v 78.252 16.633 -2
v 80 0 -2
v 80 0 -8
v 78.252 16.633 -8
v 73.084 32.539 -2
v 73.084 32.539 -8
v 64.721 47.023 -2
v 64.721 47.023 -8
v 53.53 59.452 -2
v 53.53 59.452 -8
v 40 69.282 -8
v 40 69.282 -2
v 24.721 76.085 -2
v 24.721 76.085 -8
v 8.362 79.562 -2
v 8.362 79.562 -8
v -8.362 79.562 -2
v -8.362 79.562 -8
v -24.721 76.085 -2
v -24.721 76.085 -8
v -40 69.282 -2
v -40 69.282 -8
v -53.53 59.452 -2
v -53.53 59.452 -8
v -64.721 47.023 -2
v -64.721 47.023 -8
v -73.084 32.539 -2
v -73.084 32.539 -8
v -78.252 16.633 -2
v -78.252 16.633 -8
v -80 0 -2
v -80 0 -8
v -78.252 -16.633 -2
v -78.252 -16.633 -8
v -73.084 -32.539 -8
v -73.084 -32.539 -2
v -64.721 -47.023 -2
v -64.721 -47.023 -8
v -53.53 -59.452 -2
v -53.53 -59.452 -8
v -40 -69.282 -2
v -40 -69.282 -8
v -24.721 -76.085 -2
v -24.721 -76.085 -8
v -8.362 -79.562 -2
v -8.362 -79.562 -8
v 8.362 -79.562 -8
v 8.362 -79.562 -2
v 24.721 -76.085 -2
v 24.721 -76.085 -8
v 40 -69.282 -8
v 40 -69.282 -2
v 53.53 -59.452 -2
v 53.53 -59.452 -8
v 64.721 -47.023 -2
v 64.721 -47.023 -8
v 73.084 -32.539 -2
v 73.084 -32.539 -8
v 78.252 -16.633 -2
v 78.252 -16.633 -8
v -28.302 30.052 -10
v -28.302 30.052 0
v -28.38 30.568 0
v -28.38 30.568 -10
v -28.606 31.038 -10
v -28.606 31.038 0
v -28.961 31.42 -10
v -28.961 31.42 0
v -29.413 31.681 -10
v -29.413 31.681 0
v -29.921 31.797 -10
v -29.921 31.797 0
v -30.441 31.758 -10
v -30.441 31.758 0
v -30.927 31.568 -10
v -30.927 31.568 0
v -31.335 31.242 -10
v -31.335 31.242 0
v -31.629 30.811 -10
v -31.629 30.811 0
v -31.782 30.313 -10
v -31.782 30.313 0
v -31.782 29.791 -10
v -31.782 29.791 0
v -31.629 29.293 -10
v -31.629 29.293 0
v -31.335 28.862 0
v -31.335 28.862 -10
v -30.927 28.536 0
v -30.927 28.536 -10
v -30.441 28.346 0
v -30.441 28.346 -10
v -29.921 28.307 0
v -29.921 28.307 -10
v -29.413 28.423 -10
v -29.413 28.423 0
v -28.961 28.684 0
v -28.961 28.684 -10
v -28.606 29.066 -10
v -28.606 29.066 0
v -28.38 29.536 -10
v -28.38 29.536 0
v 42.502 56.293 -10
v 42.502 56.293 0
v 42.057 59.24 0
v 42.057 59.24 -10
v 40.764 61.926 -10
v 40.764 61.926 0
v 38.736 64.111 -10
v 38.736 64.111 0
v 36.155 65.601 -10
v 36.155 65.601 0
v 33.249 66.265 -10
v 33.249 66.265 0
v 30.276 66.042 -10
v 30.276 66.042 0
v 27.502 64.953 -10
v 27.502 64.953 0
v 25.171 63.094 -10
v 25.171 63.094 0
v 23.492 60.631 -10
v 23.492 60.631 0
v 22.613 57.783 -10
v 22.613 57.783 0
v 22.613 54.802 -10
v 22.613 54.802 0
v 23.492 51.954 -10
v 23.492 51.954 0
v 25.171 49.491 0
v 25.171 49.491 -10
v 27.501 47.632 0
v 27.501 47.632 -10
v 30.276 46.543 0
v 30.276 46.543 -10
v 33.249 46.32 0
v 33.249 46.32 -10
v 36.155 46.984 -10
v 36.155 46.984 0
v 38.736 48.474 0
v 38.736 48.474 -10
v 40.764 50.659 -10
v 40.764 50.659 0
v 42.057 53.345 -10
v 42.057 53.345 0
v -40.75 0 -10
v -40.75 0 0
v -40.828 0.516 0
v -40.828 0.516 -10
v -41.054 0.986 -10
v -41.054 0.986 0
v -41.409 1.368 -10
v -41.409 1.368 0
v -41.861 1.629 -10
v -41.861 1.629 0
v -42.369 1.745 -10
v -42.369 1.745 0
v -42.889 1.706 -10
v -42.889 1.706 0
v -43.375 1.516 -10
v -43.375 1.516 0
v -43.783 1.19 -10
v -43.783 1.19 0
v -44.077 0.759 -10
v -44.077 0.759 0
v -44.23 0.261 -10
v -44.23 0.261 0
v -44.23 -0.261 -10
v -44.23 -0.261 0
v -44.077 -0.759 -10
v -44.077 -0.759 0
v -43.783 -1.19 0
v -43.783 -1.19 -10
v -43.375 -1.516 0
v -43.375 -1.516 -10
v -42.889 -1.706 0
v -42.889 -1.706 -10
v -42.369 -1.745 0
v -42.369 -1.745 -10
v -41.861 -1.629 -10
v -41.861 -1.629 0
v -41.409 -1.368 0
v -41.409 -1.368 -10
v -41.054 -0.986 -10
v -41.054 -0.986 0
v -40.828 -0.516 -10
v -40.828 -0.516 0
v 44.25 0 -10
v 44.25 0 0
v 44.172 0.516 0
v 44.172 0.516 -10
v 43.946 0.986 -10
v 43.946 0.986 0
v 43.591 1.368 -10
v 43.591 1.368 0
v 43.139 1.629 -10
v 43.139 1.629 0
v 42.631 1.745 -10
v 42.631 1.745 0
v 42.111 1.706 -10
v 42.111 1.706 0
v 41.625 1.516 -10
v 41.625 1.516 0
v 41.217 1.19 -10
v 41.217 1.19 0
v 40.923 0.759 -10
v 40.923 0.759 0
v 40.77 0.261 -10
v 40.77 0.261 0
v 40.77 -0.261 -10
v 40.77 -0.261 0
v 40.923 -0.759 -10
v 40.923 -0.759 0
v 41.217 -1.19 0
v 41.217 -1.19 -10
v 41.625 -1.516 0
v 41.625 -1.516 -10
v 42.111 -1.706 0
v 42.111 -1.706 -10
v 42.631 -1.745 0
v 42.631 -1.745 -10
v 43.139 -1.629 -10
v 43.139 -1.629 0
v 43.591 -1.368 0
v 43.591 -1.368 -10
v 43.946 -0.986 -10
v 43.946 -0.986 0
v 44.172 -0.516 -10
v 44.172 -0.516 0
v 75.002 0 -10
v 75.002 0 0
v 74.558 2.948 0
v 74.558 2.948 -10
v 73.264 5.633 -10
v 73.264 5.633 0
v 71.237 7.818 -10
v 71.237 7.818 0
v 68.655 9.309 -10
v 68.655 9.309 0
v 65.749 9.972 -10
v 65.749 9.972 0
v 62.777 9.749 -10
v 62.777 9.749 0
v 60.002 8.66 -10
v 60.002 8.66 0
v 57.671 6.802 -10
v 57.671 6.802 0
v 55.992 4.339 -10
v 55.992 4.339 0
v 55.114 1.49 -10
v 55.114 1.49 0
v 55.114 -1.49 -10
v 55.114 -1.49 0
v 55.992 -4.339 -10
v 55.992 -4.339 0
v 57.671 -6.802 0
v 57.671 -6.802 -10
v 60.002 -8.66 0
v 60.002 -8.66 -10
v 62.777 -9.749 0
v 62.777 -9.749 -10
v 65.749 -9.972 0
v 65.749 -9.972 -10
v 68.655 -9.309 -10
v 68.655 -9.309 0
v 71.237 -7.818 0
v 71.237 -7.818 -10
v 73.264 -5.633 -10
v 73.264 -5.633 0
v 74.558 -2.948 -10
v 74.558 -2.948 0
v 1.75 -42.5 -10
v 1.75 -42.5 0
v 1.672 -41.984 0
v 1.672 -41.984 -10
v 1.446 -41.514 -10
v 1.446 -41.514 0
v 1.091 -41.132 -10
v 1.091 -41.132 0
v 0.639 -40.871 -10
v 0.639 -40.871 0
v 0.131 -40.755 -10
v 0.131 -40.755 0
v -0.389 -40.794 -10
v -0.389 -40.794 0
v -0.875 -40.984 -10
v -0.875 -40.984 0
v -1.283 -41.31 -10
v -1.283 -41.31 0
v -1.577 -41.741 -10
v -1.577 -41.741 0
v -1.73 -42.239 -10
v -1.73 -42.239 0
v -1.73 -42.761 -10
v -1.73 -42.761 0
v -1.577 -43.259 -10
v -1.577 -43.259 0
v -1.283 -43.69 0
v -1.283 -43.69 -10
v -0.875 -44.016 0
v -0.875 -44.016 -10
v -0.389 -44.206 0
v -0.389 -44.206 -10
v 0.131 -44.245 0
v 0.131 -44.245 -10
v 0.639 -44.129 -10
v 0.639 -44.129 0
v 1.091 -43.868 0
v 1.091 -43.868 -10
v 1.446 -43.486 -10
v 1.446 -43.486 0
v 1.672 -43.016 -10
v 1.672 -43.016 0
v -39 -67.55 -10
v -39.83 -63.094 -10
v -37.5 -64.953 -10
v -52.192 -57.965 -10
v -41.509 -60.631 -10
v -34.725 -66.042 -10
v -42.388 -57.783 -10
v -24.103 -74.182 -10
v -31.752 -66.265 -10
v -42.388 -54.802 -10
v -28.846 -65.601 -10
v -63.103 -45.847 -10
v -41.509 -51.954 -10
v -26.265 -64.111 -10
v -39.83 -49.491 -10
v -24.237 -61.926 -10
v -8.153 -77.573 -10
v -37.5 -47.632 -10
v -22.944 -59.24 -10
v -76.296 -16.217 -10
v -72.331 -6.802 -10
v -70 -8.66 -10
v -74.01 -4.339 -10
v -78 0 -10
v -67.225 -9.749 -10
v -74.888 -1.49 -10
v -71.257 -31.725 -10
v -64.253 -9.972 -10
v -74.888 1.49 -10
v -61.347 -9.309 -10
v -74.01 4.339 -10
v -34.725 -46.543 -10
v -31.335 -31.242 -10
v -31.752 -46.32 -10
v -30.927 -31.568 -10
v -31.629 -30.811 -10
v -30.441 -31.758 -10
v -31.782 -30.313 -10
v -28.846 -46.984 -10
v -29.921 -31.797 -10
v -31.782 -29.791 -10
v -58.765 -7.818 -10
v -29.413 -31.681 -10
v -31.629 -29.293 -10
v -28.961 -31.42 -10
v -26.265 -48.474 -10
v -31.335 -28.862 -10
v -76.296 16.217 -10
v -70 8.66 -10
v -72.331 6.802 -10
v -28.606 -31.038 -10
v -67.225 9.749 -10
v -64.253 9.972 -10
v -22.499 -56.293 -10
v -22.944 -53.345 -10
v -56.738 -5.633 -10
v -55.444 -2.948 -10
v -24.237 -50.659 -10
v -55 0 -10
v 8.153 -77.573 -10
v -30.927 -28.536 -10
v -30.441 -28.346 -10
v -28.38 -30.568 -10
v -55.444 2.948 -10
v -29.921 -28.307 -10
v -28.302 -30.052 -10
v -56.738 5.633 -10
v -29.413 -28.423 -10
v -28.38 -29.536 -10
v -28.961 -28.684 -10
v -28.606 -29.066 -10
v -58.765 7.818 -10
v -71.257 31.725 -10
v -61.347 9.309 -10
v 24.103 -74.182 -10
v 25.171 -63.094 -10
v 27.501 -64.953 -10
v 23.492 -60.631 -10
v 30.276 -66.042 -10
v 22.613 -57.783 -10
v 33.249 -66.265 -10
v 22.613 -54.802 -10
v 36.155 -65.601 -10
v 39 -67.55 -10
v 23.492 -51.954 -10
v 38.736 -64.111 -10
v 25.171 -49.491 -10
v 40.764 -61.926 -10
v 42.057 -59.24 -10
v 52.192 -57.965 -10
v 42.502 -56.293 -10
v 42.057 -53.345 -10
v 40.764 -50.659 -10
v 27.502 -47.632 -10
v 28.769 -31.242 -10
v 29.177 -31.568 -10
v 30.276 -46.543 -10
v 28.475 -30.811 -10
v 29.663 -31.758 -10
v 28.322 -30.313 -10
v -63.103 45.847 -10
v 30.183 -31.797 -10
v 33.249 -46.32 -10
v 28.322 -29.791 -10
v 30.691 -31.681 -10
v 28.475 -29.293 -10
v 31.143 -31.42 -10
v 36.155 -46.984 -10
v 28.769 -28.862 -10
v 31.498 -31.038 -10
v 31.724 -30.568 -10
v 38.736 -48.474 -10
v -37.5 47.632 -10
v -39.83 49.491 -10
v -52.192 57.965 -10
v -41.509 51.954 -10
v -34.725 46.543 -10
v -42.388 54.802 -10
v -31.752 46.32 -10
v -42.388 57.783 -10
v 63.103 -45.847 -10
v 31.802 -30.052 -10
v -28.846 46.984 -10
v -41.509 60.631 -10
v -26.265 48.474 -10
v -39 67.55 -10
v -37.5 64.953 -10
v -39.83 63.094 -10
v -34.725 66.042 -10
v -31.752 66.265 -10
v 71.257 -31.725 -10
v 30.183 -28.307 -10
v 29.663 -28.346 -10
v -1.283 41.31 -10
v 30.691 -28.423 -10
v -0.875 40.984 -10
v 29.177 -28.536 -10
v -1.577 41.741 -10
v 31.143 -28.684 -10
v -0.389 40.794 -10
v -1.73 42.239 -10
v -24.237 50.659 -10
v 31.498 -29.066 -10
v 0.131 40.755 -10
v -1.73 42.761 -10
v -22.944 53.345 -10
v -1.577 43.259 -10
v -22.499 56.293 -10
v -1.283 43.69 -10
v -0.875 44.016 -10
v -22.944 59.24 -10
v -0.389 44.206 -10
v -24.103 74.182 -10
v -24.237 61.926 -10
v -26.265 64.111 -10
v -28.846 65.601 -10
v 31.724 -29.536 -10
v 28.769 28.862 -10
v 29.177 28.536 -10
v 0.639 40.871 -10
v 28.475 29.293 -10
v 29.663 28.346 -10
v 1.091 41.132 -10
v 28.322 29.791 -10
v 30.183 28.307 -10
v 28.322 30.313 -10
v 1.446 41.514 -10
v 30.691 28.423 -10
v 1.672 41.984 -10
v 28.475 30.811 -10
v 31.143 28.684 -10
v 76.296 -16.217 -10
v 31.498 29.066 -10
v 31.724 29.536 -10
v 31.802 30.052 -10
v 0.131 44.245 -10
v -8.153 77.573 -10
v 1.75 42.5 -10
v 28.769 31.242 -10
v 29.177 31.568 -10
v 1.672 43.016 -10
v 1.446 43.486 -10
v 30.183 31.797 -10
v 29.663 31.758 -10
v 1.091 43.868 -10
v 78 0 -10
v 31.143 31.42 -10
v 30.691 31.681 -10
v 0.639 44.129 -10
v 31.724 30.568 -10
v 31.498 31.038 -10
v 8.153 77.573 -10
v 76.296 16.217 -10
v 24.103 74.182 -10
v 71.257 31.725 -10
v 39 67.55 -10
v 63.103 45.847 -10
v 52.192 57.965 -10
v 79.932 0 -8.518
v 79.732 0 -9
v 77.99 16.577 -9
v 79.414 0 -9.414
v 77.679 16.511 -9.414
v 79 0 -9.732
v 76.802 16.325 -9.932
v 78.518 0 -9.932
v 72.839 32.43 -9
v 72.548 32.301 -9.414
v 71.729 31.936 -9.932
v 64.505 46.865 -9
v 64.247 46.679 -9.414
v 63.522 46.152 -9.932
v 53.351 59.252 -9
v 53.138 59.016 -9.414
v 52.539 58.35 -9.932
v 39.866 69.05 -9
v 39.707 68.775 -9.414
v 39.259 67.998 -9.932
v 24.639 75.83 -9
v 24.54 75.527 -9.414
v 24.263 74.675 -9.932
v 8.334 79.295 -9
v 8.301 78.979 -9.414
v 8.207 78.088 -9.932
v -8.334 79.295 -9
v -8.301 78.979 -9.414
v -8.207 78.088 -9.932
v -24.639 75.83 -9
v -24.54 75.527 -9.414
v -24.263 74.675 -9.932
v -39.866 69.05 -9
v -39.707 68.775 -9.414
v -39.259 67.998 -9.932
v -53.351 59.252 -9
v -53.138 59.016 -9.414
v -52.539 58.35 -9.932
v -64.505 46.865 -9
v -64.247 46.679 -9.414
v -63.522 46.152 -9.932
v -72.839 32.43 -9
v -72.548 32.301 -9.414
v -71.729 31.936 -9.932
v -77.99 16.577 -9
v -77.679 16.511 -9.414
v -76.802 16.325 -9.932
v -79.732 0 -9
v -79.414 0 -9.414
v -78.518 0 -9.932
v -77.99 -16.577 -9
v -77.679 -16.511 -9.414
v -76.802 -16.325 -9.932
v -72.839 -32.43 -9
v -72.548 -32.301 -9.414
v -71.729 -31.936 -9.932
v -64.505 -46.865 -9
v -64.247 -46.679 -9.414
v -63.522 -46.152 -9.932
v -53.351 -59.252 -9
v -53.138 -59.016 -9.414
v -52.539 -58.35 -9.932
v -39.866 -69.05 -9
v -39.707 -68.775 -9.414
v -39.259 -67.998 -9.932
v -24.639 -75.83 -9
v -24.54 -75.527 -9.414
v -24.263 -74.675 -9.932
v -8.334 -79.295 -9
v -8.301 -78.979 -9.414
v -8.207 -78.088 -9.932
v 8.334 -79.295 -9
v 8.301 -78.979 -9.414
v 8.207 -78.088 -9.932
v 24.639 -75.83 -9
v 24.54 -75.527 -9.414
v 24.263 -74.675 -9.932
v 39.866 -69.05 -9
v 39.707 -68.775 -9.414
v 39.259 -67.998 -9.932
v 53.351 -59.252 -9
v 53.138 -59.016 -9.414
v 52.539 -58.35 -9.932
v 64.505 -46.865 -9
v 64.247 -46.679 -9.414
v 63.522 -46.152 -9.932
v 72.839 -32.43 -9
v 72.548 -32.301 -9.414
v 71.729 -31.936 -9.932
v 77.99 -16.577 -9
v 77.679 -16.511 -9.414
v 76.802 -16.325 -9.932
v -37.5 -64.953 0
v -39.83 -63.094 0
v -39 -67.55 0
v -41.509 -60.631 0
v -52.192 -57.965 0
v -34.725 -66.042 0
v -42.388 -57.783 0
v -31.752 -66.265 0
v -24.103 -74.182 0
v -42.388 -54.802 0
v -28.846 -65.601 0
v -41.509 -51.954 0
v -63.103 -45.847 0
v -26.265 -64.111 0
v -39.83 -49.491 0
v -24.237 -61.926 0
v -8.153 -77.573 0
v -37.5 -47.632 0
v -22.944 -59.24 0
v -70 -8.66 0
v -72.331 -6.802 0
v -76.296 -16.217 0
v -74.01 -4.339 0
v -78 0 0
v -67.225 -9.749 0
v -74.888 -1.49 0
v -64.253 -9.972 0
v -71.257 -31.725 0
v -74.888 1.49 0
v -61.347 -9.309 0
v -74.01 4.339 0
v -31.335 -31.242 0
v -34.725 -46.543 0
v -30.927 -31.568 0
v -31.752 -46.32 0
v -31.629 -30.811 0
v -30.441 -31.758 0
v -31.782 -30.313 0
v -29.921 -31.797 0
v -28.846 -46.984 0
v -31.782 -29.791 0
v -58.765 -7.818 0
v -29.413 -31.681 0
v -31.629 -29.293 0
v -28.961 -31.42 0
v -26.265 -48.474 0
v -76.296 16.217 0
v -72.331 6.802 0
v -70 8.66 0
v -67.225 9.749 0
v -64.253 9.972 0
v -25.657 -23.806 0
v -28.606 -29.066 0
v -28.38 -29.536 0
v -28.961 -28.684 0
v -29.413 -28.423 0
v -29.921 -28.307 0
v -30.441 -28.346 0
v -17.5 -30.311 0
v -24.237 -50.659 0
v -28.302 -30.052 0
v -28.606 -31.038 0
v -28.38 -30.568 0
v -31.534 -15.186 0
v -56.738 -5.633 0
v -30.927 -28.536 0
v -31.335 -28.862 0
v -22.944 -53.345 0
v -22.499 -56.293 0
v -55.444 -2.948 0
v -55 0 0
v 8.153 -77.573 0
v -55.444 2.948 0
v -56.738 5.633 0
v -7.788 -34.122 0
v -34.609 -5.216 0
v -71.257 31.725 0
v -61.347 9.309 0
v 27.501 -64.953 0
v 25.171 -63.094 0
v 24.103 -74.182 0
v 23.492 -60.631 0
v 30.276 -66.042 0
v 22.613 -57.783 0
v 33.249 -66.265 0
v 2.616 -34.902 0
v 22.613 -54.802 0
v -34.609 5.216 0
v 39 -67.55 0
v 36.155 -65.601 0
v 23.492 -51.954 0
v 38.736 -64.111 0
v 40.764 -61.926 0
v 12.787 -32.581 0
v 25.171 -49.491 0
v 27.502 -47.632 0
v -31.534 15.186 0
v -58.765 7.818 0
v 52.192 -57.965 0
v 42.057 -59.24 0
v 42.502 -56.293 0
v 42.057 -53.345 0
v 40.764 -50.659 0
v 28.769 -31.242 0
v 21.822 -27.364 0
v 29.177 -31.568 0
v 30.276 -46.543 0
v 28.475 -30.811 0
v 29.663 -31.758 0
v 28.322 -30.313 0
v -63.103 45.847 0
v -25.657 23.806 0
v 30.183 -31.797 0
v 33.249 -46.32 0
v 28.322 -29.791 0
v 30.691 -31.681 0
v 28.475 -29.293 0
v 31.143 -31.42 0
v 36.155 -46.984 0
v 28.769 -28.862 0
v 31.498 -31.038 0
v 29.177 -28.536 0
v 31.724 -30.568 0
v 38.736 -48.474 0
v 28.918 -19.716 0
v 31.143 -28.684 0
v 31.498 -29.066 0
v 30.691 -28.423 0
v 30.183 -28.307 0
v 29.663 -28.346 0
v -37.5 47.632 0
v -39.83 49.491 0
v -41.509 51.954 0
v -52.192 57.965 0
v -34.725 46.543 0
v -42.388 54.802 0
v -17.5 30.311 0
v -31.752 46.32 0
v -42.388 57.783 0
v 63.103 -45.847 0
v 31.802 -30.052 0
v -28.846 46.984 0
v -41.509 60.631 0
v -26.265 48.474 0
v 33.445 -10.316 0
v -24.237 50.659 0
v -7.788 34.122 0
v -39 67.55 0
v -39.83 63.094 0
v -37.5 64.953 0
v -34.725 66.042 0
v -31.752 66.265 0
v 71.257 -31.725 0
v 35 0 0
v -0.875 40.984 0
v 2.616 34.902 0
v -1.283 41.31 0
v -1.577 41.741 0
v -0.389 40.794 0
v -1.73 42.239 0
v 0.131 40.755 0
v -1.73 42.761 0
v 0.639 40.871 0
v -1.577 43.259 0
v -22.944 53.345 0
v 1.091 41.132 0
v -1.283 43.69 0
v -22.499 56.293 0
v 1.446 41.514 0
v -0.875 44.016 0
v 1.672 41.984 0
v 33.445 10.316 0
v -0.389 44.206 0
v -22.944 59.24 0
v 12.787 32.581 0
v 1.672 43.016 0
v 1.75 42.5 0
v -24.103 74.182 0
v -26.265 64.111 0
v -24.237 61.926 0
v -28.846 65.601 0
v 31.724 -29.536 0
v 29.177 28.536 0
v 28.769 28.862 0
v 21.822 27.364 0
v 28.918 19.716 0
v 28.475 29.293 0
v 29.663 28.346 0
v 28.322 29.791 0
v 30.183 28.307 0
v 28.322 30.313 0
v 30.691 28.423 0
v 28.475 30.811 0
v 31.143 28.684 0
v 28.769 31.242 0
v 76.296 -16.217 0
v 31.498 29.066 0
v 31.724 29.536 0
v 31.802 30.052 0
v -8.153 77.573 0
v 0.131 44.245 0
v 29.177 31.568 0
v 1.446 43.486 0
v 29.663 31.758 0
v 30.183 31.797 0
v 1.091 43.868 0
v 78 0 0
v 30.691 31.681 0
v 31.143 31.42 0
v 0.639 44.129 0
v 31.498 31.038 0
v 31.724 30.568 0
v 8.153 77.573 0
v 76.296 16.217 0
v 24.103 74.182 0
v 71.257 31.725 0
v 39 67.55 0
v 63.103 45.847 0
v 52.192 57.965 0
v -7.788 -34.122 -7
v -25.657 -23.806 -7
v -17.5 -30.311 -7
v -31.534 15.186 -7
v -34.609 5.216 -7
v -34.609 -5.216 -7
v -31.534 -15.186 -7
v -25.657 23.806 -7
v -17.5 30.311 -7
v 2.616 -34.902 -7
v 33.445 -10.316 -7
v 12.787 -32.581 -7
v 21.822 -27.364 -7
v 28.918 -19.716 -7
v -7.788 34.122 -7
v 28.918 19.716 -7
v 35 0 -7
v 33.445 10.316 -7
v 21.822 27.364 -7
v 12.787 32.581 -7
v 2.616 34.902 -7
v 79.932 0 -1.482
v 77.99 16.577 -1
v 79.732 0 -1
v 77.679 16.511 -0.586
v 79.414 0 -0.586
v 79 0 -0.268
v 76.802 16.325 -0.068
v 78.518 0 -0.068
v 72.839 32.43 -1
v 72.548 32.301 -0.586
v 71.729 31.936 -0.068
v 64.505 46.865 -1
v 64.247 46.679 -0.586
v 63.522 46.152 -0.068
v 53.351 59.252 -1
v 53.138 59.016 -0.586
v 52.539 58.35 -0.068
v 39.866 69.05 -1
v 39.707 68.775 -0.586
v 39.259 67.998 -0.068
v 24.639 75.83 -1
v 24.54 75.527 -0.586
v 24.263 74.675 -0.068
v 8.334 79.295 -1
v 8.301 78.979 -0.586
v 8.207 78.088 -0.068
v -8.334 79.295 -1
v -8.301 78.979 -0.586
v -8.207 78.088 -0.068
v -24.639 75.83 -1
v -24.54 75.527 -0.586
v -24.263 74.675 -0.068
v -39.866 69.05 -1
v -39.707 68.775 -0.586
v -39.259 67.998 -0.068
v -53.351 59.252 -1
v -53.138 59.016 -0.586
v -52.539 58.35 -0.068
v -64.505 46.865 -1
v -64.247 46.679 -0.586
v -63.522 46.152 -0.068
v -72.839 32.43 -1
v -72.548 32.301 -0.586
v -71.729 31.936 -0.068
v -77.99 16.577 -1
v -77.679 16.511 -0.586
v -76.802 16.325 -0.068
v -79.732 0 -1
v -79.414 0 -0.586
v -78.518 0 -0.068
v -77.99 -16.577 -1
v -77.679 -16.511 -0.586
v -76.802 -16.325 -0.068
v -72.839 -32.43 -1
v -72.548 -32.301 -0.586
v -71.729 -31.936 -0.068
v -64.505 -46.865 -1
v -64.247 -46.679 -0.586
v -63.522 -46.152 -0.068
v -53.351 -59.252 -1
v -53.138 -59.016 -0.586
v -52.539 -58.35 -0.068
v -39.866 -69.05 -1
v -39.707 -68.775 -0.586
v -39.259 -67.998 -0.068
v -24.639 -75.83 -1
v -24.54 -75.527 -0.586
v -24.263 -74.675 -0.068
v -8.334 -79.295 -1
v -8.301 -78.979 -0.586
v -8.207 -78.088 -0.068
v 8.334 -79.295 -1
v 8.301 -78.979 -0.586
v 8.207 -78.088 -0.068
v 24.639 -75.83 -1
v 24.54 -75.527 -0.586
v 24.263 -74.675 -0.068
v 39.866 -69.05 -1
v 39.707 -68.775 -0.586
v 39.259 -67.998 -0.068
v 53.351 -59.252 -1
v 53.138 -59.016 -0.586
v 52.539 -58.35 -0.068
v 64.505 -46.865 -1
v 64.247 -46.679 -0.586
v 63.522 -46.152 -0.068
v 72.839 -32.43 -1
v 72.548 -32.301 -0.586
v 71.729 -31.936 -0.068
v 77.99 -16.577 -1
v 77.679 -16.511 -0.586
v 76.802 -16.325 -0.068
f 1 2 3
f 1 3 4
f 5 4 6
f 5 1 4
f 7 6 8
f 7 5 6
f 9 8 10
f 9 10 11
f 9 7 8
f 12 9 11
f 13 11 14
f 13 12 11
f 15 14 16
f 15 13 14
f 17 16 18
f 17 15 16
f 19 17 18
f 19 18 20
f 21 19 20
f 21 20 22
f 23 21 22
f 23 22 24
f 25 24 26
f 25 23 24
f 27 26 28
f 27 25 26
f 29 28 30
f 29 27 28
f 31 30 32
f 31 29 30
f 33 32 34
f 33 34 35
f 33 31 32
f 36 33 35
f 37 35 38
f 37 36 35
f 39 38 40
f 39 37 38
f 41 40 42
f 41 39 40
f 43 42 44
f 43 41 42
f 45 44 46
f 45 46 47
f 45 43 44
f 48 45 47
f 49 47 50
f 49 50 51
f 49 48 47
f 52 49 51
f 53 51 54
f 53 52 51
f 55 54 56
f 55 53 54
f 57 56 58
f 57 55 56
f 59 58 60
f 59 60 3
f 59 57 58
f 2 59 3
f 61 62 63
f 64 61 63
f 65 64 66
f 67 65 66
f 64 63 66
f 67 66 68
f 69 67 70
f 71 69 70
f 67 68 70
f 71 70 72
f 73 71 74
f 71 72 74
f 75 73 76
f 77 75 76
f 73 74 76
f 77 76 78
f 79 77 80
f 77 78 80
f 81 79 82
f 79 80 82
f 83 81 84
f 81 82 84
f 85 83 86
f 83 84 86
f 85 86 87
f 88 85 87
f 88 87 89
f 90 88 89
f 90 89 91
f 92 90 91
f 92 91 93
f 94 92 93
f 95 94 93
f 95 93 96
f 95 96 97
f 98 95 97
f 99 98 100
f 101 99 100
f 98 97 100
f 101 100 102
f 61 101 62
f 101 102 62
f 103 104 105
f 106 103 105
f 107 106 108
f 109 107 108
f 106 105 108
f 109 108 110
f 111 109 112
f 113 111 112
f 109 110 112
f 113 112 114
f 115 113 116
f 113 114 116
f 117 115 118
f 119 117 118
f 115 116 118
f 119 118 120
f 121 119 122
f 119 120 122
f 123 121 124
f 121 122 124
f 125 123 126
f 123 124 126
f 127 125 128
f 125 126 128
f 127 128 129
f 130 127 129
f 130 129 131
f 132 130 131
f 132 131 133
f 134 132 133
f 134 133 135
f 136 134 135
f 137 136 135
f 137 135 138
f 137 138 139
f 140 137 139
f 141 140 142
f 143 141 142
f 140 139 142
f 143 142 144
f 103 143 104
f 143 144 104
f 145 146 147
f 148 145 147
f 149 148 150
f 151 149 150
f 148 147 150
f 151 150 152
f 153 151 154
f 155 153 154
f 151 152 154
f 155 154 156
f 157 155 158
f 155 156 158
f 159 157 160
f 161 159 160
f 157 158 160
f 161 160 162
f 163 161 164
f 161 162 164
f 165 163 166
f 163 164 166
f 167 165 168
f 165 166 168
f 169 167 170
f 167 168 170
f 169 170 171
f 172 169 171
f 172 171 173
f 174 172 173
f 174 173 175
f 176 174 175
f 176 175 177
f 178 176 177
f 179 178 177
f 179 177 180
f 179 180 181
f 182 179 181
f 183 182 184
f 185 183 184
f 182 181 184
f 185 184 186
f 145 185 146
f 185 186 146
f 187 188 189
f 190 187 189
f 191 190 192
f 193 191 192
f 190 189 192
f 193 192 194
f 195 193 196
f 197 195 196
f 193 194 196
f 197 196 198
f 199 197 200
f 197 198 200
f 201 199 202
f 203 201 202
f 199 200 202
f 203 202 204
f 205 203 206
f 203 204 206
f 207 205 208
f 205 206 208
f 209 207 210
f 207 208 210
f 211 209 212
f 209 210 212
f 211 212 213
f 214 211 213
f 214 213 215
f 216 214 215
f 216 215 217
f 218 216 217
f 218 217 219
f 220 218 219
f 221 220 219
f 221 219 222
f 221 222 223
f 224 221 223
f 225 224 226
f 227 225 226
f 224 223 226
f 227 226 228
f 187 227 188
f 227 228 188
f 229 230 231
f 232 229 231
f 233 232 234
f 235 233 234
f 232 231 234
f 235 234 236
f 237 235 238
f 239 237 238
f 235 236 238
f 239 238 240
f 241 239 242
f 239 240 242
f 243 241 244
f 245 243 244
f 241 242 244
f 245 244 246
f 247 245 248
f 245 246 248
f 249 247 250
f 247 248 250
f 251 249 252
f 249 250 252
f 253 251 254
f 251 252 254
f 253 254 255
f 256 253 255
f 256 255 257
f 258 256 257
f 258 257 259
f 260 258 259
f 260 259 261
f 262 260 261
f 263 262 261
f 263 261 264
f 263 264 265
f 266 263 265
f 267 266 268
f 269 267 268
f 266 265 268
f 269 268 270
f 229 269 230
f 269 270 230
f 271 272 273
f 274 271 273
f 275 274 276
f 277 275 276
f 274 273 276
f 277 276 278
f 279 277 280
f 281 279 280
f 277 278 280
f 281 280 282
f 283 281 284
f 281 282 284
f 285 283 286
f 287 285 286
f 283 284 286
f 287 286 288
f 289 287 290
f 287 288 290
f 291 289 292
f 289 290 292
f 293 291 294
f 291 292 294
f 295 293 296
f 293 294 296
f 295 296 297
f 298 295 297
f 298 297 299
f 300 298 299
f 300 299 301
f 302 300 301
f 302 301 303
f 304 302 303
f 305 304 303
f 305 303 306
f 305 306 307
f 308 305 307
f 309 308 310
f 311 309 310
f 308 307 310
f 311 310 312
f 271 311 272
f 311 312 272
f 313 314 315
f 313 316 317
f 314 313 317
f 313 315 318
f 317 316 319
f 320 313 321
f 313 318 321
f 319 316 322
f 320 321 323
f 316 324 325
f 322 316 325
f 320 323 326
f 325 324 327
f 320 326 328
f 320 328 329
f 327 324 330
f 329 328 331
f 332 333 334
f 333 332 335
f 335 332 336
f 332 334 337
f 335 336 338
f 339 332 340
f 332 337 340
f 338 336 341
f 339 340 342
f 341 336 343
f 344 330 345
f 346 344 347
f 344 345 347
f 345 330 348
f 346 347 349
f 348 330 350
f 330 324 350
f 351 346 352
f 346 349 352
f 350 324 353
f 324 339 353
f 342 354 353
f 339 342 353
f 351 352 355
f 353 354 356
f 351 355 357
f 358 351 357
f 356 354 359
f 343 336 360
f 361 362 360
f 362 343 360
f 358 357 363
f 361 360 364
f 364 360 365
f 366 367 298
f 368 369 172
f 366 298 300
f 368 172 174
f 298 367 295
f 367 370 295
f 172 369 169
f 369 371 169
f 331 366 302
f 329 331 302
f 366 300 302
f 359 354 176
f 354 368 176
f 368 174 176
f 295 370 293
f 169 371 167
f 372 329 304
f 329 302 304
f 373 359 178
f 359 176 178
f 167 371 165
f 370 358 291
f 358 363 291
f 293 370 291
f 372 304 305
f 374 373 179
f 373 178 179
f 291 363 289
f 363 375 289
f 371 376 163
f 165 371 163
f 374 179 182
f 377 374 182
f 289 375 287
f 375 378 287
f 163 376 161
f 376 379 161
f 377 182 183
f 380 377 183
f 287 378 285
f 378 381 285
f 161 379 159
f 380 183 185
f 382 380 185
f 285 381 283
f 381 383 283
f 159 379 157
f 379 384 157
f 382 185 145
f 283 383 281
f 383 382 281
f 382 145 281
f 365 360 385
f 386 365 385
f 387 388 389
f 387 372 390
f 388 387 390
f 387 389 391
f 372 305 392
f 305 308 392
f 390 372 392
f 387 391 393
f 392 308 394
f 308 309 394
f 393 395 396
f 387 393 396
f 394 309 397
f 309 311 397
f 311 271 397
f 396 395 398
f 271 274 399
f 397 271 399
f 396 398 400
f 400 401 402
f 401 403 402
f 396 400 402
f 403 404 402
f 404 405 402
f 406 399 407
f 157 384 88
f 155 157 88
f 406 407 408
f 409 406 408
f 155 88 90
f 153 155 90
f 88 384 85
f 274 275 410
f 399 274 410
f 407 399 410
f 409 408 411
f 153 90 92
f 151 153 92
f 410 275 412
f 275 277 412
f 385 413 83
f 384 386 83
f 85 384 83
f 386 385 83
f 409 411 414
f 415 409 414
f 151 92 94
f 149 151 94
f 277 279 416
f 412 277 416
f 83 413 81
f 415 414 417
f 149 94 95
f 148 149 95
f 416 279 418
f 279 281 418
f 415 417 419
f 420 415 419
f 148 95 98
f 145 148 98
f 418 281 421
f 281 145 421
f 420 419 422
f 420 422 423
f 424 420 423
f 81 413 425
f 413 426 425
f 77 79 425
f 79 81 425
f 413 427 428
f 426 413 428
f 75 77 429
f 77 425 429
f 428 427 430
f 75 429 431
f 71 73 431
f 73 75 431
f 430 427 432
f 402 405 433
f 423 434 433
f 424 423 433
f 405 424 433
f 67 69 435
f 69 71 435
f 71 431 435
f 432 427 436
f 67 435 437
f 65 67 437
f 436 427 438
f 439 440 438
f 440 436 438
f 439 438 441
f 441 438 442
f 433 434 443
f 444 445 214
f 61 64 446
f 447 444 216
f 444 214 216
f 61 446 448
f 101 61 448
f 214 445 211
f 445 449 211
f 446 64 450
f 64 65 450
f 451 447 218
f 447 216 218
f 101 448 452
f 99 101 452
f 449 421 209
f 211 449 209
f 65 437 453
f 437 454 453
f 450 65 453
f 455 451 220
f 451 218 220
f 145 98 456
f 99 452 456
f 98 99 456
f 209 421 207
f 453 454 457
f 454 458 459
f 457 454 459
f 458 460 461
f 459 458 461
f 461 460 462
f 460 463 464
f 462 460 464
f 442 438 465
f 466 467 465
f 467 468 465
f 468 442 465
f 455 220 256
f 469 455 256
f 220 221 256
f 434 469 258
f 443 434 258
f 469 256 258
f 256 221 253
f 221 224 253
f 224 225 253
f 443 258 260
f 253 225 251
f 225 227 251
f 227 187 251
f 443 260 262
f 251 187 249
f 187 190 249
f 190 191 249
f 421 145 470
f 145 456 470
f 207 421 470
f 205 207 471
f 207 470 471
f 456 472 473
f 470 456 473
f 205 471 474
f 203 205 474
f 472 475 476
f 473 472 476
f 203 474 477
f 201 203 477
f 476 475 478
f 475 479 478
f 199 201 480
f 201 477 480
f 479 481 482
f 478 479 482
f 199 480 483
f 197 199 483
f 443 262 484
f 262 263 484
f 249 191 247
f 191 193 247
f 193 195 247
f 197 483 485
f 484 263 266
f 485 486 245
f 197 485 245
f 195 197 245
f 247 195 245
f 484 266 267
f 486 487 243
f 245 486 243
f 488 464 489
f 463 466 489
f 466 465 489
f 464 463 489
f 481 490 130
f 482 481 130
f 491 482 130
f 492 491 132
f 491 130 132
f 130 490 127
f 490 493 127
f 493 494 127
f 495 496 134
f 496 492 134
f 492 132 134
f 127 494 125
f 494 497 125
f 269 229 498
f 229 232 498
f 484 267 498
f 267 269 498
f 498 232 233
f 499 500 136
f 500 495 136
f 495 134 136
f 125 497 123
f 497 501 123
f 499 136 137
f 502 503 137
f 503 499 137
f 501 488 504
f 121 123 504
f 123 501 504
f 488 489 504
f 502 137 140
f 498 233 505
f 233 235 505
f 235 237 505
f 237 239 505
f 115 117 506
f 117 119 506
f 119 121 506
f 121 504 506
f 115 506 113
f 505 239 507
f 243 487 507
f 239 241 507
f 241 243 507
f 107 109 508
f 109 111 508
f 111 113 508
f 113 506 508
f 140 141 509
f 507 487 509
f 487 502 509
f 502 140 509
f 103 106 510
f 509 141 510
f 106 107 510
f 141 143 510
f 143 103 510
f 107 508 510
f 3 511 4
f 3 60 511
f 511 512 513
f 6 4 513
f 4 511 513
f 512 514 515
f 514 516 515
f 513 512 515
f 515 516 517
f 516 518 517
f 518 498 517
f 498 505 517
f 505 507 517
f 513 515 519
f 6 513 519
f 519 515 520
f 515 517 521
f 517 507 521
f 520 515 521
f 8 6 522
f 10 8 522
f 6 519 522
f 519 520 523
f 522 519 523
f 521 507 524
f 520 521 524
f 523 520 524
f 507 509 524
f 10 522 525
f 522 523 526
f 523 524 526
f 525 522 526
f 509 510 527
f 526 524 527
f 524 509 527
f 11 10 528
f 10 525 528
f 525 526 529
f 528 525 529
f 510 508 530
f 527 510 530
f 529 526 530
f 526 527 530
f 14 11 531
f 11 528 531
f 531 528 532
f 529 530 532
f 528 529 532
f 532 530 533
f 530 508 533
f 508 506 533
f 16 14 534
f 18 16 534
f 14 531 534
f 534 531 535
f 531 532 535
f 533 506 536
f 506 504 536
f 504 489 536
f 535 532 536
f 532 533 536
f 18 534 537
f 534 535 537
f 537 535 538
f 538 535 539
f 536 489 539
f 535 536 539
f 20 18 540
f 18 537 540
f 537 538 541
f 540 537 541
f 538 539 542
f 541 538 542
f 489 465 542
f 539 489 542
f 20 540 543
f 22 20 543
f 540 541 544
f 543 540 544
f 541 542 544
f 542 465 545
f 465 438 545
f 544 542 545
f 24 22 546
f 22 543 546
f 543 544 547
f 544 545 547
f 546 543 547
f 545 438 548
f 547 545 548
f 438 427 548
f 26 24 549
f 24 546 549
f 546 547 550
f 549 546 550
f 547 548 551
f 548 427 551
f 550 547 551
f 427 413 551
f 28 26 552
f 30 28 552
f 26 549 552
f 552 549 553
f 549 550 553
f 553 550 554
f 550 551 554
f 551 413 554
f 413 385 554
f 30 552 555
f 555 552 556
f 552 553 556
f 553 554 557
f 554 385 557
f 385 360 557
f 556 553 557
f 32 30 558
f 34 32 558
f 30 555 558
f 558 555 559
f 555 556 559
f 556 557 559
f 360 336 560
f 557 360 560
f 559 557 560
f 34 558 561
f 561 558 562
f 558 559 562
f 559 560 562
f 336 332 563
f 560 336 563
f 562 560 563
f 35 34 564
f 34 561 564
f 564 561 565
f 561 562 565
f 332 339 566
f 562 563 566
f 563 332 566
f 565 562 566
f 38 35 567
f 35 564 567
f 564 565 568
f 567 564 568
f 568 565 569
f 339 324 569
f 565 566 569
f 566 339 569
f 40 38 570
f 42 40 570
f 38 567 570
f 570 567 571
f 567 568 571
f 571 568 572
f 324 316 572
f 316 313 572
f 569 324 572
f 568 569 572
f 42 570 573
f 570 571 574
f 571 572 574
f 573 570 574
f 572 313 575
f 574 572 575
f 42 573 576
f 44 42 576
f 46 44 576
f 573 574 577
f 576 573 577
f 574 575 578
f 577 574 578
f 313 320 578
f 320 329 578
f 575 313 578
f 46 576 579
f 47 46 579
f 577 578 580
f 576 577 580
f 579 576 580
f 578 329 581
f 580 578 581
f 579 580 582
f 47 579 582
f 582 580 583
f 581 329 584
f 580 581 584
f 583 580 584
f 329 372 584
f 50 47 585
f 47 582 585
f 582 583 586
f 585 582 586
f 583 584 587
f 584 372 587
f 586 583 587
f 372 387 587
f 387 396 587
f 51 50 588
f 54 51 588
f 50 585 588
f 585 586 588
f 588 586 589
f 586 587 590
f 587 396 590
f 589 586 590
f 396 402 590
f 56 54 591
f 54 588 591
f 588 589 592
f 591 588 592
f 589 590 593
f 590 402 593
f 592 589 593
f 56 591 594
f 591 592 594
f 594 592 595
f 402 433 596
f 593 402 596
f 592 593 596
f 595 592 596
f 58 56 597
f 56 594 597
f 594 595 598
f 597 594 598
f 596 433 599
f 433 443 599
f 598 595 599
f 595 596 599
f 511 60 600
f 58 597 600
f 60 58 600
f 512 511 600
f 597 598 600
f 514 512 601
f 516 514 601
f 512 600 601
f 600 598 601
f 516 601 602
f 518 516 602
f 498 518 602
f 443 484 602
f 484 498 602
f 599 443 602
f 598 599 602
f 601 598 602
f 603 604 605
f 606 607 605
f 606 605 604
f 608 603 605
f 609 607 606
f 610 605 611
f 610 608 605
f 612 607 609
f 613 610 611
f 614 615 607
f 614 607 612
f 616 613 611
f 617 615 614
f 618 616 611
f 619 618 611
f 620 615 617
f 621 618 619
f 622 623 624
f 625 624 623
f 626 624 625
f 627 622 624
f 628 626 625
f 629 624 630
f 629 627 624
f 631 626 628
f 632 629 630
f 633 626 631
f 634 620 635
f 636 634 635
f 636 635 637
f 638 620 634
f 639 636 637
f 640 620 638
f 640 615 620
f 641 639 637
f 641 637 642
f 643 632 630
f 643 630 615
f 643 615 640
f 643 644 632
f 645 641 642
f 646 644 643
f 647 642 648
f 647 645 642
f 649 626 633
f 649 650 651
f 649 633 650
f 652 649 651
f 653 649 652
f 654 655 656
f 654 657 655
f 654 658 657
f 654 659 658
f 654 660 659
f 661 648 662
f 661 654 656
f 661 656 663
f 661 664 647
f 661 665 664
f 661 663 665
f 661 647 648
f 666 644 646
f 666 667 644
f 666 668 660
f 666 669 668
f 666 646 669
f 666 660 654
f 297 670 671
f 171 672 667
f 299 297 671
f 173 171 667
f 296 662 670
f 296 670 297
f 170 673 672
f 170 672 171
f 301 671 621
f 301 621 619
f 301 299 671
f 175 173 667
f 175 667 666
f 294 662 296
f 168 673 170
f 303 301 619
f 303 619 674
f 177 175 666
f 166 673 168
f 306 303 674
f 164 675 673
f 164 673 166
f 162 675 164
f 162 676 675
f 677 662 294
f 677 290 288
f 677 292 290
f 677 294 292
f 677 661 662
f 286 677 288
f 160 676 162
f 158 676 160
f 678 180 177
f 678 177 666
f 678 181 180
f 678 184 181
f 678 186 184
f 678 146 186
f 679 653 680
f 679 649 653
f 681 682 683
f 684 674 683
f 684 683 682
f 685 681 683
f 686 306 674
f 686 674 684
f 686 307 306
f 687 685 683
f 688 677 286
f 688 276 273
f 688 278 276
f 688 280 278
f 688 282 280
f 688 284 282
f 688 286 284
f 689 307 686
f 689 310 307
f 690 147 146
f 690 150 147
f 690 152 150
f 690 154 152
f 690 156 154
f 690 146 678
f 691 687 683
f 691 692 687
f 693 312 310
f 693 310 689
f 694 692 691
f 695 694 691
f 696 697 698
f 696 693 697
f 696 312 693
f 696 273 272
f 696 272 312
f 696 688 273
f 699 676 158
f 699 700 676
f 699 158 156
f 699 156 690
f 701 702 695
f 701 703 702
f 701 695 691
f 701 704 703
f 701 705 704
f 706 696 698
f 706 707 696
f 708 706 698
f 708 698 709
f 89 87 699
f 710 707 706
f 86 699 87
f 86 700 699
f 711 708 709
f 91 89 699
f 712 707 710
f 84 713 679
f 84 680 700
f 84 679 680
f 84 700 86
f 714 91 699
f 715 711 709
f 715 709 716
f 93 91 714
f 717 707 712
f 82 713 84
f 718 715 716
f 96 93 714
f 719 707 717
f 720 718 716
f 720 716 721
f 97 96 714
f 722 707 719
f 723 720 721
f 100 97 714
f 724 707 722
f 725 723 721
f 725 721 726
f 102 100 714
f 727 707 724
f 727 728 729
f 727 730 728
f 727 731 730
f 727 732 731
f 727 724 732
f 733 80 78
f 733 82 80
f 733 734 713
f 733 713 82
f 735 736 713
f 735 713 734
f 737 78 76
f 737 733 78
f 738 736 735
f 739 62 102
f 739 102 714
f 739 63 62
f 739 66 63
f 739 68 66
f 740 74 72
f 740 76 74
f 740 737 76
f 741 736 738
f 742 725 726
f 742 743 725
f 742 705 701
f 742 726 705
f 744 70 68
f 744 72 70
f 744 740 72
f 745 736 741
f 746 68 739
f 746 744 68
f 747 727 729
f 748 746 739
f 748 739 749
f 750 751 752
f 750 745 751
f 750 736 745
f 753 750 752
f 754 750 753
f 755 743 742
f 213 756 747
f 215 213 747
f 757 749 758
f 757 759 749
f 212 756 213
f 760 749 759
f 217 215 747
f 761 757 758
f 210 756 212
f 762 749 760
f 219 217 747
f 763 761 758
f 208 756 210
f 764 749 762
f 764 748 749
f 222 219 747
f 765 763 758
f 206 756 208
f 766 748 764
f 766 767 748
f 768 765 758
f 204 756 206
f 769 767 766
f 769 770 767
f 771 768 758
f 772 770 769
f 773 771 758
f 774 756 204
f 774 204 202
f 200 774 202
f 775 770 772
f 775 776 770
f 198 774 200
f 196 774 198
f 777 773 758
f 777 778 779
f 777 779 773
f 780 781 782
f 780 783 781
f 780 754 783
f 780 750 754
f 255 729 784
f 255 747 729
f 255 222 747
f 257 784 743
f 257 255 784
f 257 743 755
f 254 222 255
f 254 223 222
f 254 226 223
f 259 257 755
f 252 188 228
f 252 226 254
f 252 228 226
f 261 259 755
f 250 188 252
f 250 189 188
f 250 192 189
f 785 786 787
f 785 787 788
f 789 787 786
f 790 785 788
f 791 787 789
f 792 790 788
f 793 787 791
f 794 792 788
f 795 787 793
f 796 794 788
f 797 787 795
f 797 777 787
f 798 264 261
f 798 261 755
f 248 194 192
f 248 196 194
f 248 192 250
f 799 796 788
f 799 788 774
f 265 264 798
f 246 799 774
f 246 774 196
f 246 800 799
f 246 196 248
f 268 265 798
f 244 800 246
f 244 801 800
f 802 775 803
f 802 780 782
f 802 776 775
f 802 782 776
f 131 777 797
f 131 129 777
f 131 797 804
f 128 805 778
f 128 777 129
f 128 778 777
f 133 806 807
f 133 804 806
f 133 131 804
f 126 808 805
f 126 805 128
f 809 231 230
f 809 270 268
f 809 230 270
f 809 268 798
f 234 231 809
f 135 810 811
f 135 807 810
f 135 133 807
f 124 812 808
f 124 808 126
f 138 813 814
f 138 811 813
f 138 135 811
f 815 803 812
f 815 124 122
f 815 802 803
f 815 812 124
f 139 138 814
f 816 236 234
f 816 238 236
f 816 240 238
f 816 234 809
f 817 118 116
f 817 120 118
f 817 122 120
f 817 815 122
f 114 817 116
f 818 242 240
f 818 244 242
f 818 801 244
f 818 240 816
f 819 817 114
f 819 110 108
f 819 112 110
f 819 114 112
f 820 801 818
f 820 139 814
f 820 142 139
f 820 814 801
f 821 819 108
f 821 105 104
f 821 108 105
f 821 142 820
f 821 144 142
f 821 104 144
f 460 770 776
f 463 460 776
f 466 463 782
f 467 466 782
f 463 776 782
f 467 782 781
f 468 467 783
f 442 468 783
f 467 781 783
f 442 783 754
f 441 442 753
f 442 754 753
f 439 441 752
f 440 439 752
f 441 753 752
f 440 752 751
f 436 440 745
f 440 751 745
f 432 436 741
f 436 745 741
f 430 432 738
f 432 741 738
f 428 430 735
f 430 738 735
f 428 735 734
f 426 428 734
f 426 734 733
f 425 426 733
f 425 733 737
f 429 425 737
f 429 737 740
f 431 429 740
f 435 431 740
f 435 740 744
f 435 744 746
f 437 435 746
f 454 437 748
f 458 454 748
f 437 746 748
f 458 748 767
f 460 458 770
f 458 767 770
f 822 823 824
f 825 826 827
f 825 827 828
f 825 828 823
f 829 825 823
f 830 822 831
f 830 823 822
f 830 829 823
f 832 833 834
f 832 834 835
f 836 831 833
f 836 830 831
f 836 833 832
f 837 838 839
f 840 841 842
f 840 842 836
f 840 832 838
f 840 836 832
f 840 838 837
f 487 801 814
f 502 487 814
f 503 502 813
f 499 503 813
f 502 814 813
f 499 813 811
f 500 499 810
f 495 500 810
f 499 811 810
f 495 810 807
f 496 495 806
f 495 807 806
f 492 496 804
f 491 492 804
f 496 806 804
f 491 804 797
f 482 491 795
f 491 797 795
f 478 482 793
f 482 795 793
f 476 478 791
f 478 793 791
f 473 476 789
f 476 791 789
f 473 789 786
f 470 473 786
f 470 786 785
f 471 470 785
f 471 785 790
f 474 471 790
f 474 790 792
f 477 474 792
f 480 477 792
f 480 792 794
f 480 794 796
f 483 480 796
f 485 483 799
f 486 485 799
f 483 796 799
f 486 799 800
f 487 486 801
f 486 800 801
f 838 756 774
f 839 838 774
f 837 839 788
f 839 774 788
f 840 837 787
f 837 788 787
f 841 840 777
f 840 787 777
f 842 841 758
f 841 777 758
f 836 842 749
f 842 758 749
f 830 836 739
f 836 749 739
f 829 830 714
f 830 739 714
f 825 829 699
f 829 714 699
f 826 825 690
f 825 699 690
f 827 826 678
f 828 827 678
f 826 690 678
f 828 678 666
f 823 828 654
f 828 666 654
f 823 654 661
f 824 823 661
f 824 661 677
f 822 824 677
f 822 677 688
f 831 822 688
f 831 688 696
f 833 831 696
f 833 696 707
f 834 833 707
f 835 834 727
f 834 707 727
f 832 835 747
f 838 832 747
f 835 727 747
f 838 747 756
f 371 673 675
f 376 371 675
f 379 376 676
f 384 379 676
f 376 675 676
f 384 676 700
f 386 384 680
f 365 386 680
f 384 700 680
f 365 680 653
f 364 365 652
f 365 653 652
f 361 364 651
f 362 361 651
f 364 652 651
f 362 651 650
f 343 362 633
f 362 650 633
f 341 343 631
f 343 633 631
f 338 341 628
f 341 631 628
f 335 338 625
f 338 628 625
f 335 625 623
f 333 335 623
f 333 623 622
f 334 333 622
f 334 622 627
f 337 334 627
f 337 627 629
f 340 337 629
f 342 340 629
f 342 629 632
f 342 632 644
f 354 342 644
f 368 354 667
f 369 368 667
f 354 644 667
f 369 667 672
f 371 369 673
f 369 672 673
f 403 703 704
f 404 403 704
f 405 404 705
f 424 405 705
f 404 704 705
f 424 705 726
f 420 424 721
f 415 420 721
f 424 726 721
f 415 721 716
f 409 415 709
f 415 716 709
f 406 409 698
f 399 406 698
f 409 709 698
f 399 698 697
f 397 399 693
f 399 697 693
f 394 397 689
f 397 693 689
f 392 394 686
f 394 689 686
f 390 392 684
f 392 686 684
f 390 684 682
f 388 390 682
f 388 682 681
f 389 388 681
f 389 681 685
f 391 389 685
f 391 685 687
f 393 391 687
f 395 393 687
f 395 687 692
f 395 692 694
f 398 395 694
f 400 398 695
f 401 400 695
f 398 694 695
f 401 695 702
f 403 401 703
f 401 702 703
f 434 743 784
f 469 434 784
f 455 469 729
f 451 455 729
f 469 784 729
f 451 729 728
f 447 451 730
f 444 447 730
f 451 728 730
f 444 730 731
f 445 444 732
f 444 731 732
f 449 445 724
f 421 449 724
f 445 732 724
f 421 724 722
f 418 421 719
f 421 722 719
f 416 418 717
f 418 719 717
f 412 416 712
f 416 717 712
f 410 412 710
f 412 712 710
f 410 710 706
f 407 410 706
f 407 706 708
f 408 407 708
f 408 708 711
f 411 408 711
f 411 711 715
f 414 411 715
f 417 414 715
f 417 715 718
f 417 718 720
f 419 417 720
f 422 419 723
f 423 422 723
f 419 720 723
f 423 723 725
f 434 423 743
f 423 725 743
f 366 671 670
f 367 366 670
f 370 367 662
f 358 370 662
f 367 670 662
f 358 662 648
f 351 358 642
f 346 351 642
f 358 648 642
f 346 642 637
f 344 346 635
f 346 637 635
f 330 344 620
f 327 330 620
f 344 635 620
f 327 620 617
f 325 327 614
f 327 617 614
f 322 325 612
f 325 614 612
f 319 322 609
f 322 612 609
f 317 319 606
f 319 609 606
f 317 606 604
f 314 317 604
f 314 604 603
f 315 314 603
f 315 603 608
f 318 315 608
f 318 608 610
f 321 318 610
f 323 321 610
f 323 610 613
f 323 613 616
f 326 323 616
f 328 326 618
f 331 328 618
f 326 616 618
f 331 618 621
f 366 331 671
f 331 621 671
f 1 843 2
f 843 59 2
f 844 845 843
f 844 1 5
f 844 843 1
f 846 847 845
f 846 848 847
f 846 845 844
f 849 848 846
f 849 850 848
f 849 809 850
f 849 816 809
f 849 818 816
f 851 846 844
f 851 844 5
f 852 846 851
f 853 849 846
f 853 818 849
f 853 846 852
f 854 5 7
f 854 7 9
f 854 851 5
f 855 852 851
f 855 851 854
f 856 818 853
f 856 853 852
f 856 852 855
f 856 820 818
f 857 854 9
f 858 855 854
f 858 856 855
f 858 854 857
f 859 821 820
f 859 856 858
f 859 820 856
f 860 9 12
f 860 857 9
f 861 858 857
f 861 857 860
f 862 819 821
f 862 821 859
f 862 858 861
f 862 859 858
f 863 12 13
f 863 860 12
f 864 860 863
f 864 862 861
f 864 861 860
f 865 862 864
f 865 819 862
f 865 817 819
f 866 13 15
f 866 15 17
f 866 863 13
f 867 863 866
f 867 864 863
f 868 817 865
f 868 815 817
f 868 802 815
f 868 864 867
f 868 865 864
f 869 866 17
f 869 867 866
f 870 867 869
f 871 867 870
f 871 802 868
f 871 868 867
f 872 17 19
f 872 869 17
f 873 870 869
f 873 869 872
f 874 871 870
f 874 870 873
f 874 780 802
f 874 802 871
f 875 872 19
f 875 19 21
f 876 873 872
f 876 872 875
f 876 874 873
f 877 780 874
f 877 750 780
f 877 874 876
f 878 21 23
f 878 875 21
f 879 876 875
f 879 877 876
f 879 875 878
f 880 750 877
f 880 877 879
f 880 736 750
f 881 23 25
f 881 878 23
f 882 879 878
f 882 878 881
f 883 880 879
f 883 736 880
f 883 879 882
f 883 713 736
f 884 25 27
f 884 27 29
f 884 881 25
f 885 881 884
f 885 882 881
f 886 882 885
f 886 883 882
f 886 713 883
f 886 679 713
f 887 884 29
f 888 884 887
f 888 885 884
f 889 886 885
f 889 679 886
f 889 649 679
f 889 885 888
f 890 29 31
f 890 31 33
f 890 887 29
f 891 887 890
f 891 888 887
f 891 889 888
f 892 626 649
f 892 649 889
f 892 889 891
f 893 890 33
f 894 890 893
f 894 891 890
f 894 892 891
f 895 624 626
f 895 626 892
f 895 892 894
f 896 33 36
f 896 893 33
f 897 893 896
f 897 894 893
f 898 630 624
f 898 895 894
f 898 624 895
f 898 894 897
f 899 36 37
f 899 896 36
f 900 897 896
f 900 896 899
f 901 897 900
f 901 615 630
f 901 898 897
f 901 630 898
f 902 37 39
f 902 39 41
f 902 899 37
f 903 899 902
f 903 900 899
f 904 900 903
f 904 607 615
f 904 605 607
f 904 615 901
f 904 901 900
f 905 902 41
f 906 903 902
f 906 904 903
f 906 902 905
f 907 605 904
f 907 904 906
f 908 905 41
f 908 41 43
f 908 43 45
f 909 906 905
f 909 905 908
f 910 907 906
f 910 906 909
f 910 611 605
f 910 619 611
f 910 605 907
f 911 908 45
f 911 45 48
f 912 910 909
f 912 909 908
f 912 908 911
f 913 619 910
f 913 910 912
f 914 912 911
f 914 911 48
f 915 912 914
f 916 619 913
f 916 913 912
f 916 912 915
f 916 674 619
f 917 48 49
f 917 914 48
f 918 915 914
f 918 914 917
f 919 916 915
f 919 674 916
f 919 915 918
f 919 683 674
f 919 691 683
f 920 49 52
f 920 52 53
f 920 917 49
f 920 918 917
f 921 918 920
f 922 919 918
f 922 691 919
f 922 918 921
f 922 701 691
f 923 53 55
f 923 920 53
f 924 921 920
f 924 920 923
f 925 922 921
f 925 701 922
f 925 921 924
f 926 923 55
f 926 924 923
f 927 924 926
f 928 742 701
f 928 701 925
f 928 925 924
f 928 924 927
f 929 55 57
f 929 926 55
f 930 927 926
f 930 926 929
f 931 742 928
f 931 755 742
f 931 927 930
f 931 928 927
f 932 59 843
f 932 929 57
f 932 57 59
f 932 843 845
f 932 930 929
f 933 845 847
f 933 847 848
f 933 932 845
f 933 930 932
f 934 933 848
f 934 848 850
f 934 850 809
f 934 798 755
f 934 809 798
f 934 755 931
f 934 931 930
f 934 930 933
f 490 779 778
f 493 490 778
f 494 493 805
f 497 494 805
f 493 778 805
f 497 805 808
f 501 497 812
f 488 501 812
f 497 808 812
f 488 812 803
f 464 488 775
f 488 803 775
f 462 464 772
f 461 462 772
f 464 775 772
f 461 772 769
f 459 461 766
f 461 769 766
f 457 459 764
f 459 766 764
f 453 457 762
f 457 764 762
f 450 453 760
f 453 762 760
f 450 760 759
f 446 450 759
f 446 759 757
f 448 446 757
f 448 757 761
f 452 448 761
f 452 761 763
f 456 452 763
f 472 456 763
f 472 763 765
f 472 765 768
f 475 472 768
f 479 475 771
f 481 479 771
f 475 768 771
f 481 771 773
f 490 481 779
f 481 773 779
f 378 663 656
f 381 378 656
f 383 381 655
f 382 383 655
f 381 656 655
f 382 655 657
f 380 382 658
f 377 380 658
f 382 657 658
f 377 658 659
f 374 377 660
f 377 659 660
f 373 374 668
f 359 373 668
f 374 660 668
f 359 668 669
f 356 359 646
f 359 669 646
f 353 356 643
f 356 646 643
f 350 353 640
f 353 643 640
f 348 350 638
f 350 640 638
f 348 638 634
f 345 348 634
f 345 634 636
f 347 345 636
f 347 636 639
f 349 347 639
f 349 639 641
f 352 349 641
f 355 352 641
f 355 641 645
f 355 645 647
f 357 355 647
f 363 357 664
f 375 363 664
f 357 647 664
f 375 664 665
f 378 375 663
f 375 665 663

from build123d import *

# Parameters (mm, degrees)
SKETCH_3_R          = 80
EXTRUDE_1_DEPTH     = 10
SKETCH_4_R          = 35
CUT_EXTRUDE_1_DEPTH = 7
SKETCH_5_R          = 10
CUT_EXTRUDE_2_DEPTH = 10
SKETCH_6_R          = 1.75
CUT_EXTRUDE_3_DEPTH = 10
FILLET_1_R          = 2


with BuildPart() as part:
    # 草图3 → 凸台-拉伸1 (new body)
    with BuildSketch(Plane.XY):
        Circle(SKETCH_3_R)
    extrude(amount=-EXTRUDE_1_DEPTH)

    # 草图4 → 切除-拉伸1 (cut)
    with BuildSketch(Plane.XY):
        Circle(SKETCH_4_R)
    extrude(amount=-CUT_EXTRUDE_1_DEPTH, mode=Mode.SUBTRACT)

    # 草图5 → 切除-拉伸2 (cut)
    with BuildSketch(Plane.XY):
        with Locations((-65, 0)):
            Circle(SKETCH_5_R)
        with Locations((-32.4995, 56.292517271)):
            Circle(SKETCH_5_R)
        with Locations((32.5015, 56.292517271)):
            Circle(SKETCH_5_R)
        with Locations((65.002, 0)):
            Circle(SKETCH_5_R)
        with Locations((32.5015, -56.292517271)):
            Circle(SKETCH_5_R)
        with Locations((-32.4995, -56.292517271)):
            Circle(SKETCH_5_R)
    extrude(amount=-CUT_EXTRUDE_2_DEPTH, mode=Mode.SUBTRACT)

    # 草图6 → 切除-拉伸3 (cut)
    with BuildSketch(Plane.XY):
        with Locations((-42.5, 0)):
            Circle(SKETCH_6_R)
        with Locations((-30.0520382, 30.0520382)):
            Circle(SKETCH_6_R)
        with Locations((0, 42.5)):
            Circle(SKETCH_6_R)
        with Locations((30.0520382, 30.0520382)):
            Circle(SKETCH_6_R)
        with Locations((42.5, 0)):
            Circle(SKETCH_6_R)
        with Locations((30.0520382, -30.0520382)):
            Circle(SKETCH_6_R)
        with Locations((0, -42.5)):
            Circle(SKETCH_6_R)
        with Locations((-30.0520382, -30.0520382)):
            Circle(SKETCH_6_R)
    extrude(amount=-CUT_EXTRUDE_3_DEPTH, mode=Mode.SUBTRACT)

    # 圆角1
    fillet_1_edges = [part.edges().sort_by_distance(p)[0] for p in [
        (-80, 0, 0),
        (-80, 0, -10),
    ]]
    fillet(fillet_1_edges, radius=FILLET_1_R)


solid = part.part
